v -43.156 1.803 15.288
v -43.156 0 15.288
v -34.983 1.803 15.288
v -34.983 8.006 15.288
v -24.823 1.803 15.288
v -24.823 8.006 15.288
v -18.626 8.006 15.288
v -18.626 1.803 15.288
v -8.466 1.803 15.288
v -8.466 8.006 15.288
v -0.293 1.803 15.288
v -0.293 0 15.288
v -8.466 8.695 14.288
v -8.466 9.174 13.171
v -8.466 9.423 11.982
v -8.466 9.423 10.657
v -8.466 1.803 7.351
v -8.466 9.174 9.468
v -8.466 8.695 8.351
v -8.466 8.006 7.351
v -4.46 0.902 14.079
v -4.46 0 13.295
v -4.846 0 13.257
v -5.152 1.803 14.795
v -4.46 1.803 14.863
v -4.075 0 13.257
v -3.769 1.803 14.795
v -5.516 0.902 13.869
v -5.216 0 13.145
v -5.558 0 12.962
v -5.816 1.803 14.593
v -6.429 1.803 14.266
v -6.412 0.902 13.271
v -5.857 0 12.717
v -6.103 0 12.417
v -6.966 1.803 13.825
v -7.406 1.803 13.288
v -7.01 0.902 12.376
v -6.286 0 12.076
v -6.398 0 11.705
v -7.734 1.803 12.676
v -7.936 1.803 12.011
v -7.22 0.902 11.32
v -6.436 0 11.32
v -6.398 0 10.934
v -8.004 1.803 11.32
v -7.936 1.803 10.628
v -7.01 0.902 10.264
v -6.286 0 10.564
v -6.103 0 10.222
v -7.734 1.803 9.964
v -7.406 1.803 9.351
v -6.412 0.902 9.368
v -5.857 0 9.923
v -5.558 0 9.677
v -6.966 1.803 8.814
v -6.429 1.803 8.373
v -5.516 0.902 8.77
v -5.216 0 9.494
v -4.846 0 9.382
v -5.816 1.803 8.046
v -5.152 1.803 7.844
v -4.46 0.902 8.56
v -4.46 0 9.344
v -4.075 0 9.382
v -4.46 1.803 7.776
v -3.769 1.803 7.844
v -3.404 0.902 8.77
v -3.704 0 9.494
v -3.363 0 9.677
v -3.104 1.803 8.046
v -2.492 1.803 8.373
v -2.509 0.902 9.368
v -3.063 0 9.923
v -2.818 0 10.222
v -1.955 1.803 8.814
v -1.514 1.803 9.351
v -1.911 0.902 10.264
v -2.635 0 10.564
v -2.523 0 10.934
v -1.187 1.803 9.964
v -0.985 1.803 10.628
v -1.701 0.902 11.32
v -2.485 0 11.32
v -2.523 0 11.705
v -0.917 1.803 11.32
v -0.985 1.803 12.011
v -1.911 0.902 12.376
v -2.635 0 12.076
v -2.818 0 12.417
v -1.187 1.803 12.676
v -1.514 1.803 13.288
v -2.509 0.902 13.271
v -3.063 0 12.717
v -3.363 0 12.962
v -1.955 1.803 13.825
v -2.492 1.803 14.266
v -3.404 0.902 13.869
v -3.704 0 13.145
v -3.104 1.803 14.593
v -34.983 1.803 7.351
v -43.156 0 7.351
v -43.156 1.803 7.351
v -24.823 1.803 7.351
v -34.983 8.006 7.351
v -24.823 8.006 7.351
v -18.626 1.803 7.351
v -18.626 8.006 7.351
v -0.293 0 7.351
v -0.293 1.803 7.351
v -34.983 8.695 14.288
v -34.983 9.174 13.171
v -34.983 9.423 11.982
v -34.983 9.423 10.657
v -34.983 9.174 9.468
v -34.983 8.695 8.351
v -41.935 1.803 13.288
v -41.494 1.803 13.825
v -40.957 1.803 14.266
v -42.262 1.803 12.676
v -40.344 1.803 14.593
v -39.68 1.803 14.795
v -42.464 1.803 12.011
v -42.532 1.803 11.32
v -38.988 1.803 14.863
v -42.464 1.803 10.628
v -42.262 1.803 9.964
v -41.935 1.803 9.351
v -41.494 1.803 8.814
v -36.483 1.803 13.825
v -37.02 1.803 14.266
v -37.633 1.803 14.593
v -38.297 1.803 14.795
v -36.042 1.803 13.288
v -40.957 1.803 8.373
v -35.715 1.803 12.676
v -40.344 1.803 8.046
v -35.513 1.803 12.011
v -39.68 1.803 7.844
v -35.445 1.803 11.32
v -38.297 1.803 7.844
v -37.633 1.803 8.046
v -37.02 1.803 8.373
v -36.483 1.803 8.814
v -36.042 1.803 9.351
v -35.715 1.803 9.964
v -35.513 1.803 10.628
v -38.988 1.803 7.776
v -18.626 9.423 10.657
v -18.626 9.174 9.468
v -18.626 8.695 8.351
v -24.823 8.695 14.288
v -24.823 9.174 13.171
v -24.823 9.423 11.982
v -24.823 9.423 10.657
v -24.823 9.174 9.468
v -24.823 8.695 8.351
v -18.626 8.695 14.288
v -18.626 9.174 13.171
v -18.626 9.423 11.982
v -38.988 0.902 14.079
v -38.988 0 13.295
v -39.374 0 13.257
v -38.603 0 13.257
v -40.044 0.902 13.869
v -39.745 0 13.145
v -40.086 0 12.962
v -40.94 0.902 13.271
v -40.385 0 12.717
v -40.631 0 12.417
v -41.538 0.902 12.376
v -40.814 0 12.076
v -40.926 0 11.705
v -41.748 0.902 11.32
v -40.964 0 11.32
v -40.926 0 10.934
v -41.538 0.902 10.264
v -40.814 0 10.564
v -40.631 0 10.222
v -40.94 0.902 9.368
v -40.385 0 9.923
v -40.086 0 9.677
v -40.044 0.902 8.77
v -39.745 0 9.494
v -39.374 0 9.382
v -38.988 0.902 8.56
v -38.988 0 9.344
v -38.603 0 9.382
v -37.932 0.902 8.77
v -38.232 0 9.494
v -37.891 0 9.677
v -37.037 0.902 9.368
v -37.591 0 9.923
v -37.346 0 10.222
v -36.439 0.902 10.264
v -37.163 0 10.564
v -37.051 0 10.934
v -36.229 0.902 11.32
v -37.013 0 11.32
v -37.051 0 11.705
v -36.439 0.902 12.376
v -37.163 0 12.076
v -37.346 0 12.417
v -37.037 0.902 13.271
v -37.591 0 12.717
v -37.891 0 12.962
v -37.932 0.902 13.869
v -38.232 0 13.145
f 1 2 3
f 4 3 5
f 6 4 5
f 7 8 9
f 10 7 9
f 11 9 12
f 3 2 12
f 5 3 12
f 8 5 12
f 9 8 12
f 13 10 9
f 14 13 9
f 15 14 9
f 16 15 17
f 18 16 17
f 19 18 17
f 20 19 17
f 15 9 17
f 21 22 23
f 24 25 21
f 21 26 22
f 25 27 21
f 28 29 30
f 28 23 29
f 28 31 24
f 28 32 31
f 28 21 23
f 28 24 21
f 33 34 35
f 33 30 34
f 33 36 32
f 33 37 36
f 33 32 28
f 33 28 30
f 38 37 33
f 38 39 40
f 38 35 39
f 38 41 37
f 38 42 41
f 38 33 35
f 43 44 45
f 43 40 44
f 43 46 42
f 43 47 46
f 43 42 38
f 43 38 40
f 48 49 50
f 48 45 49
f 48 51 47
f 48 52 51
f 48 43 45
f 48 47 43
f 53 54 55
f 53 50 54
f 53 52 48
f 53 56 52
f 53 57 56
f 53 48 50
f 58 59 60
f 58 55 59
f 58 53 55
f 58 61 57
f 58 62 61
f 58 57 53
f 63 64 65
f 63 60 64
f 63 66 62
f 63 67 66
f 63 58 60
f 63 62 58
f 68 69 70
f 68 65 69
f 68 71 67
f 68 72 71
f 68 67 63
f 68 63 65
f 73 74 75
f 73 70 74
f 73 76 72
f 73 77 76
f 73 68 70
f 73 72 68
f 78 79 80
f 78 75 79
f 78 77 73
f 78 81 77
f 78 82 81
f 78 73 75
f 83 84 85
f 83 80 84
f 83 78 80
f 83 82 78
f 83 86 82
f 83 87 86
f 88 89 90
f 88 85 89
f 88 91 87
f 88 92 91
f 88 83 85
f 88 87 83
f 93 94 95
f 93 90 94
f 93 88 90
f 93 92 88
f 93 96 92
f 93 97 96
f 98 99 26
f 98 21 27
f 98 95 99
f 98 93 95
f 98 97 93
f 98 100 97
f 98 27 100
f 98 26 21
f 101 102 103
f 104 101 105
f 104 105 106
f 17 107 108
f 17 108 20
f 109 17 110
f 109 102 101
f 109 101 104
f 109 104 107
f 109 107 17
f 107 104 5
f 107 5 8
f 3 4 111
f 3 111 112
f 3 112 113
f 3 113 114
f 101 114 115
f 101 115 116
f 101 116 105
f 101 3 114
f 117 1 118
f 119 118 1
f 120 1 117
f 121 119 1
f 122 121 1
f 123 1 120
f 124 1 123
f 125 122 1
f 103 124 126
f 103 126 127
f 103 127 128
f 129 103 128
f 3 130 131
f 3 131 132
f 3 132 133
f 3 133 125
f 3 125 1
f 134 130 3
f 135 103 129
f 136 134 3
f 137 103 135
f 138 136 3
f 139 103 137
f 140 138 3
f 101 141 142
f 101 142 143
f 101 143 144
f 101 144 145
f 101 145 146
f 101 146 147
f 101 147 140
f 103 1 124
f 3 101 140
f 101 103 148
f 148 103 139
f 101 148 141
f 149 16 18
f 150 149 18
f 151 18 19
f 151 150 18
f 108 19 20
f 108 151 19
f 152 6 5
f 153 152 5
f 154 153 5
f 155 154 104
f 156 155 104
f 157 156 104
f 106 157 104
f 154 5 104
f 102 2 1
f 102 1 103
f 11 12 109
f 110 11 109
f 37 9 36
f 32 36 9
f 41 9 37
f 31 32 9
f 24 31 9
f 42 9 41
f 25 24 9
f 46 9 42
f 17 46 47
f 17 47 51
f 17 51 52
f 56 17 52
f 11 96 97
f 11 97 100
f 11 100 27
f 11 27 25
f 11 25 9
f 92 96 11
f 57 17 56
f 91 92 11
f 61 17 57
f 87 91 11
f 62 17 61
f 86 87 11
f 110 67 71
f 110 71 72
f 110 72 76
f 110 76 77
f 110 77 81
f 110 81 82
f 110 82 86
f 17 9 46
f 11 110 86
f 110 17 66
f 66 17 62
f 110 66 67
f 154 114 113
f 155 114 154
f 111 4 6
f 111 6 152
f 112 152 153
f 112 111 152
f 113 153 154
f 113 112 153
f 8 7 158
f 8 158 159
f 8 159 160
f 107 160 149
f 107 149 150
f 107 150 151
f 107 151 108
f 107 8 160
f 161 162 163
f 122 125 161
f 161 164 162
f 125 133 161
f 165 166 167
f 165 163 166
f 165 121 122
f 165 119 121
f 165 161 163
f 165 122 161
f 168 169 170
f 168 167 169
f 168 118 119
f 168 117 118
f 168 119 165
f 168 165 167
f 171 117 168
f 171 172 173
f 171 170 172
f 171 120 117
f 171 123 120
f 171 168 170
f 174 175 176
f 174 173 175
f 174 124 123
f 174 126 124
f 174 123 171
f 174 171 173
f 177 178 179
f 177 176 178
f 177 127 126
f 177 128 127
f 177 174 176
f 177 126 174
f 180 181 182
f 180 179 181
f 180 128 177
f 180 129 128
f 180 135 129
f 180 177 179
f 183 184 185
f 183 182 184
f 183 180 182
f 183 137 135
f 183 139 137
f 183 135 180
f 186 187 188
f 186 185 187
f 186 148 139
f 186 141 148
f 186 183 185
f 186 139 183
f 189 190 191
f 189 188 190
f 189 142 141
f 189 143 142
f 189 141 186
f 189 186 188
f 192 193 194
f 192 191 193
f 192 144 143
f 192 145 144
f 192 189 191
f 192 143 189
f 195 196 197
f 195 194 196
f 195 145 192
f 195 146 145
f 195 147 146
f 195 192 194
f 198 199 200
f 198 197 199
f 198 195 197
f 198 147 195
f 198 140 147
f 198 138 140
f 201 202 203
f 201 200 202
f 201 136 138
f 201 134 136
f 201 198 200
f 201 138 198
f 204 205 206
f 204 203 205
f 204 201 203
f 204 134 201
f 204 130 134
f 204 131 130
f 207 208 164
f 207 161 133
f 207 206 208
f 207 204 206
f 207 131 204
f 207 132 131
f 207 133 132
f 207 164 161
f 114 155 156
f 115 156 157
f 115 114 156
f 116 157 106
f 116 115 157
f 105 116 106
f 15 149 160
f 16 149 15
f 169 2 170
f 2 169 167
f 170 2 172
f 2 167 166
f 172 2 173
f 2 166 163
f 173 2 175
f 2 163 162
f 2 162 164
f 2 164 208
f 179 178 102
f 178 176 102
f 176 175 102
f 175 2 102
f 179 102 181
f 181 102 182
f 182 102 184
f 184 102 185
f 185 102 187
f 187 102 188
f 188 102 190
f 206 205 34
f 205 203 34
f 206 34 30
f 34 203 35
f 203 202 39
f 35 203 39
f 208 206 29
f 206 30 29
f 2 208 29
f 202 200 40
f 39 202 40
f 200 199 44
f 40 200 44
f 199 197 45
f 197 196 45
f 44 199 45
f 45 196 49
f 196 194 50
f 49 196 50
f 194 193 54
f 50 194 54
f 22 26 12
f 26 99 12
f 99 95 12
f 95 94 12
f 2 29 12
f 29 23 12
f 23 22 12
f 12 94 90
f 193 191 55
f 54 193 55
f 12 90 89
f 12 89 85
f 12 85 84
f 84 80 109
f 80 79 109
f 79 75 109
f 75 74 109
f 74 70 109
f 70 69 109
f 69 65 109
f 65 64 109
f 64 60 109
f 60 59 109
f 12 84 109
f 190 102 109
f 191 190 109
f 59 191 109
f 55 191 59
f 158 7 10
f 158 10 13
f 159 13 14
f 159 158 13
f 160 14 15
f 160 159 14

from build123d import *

# Parameters (mm, degrees)
SKETCH2_W                                     = 42.8625
SKETCH2_H                                     = 7.9375
BOSS_EXTRUDE1_DEPTH                           = 1.8034
SKETCH3_W                                     = 10.16
SKETCH3_H                                     = 7.9375
BOSS_EXTRUDE2_DEPTH                           = 7.62
CUT_EXTRUDE1_DEPTH                            = 35.69005
CSK_FOR_6_FLAT_HEAD_MACHINE_SCREW1_AT_2_COUNT = 2
CSK_FOR_6_FLAT_HEAD_MACHINE_SCREW1_AT_2_PITCH = 34.52812501


with BuildPart() as part:
    # Sketch2 → Boss-Extrude1 (new body)
    with BuildSketch(Plane(origin=(0, 0, 0), x_dir=(1, 0, 0), z_dir=(0, 1, 0))):
        with Locations((-21.724415377, -11.319579887)):
            Rectangle(SKETCH2_W, SKETCH2_H)
    extrude(amount=BOSS_EXTRUDE1_DEPTH)

    # Sketch3 → Boss-Extrude2 (add)
    with BuildSketch(Plane(origin=(0, 1.8034, 0), x_dir=(1, 0, 0), z_dir=(0, 1, 0))):
        with Locations((-29.903215377, -11.319579887)):
            Rectangle(SKETCH3_W, SKETCH3_H)
        with Locations((-13.545615377, -11.319579887)):
            Rectangle(SKETCH3_W, SKETCH3_H)
    extrude(amount=BOSS_EXTRUDE2_DEPTH)

    # Sketch5 → Cut-Extrude1 (cut, through all)
    with BuildSketch(Plane.ZY.offset(34.983215377)):
        with BuildLine():
            Line((7.350829887, 8.005737457), (7.350829887, 10.117841345))
            Line((7.350829887, 10.117841345), (15.288329887, 10.117841345))
            Line((15.288329887, 10.117841345), (15.288329887, 8.005737457))
            ThreePointArc((15.288329887, 8.005737457), (11.319579887, 9.459221838), (7.350829887, 8.005737457))
        make_face()
    extrude(amount=-CUT_EXTRUDE1_DEPTH, mode=Mode.SUBTRACT)

    # Sketch6 → CSK for #6 Flat Head Machine Screw1 (revolve, cut)
    with BuildSketch(Plane(origin=(-4.460352877, 1.8034, 11.319579887), x_dir=(0, 0, 1), z_dir=(1, 0, 0))):
        Polygon((0, 0), (0, 1.8034), (1.89865, 1.8034), (1.89865, 1.891953401), (3.5433, 0), align=None)
    csk_for_6_flat_head_machine_screw1 = revolve(axis=Axis((-4.460352877, 8.1534, 11.319579887), (0, -1, 0)), mode=Mode.SUBTRACT)

    # CSK for #6 Flat Head Machine Screw1 at 2: CSK for #6 Flat Head Machine Screw1 ×2
    with Locations(*[(-i * CSK_FOR_6_FLAT_HEAD_MACHINE_SCREW1_AT_2_PITCH, 0, 0) for i in range(1, CSK_FOR_6_FLAT_HEAD_MACHINE_SCREW1_AT_2_COUNT)]):
        add(csk_for_6_flat_head_machine_screw1, mode=Mode.SUBTRACT)


solid = part.part
